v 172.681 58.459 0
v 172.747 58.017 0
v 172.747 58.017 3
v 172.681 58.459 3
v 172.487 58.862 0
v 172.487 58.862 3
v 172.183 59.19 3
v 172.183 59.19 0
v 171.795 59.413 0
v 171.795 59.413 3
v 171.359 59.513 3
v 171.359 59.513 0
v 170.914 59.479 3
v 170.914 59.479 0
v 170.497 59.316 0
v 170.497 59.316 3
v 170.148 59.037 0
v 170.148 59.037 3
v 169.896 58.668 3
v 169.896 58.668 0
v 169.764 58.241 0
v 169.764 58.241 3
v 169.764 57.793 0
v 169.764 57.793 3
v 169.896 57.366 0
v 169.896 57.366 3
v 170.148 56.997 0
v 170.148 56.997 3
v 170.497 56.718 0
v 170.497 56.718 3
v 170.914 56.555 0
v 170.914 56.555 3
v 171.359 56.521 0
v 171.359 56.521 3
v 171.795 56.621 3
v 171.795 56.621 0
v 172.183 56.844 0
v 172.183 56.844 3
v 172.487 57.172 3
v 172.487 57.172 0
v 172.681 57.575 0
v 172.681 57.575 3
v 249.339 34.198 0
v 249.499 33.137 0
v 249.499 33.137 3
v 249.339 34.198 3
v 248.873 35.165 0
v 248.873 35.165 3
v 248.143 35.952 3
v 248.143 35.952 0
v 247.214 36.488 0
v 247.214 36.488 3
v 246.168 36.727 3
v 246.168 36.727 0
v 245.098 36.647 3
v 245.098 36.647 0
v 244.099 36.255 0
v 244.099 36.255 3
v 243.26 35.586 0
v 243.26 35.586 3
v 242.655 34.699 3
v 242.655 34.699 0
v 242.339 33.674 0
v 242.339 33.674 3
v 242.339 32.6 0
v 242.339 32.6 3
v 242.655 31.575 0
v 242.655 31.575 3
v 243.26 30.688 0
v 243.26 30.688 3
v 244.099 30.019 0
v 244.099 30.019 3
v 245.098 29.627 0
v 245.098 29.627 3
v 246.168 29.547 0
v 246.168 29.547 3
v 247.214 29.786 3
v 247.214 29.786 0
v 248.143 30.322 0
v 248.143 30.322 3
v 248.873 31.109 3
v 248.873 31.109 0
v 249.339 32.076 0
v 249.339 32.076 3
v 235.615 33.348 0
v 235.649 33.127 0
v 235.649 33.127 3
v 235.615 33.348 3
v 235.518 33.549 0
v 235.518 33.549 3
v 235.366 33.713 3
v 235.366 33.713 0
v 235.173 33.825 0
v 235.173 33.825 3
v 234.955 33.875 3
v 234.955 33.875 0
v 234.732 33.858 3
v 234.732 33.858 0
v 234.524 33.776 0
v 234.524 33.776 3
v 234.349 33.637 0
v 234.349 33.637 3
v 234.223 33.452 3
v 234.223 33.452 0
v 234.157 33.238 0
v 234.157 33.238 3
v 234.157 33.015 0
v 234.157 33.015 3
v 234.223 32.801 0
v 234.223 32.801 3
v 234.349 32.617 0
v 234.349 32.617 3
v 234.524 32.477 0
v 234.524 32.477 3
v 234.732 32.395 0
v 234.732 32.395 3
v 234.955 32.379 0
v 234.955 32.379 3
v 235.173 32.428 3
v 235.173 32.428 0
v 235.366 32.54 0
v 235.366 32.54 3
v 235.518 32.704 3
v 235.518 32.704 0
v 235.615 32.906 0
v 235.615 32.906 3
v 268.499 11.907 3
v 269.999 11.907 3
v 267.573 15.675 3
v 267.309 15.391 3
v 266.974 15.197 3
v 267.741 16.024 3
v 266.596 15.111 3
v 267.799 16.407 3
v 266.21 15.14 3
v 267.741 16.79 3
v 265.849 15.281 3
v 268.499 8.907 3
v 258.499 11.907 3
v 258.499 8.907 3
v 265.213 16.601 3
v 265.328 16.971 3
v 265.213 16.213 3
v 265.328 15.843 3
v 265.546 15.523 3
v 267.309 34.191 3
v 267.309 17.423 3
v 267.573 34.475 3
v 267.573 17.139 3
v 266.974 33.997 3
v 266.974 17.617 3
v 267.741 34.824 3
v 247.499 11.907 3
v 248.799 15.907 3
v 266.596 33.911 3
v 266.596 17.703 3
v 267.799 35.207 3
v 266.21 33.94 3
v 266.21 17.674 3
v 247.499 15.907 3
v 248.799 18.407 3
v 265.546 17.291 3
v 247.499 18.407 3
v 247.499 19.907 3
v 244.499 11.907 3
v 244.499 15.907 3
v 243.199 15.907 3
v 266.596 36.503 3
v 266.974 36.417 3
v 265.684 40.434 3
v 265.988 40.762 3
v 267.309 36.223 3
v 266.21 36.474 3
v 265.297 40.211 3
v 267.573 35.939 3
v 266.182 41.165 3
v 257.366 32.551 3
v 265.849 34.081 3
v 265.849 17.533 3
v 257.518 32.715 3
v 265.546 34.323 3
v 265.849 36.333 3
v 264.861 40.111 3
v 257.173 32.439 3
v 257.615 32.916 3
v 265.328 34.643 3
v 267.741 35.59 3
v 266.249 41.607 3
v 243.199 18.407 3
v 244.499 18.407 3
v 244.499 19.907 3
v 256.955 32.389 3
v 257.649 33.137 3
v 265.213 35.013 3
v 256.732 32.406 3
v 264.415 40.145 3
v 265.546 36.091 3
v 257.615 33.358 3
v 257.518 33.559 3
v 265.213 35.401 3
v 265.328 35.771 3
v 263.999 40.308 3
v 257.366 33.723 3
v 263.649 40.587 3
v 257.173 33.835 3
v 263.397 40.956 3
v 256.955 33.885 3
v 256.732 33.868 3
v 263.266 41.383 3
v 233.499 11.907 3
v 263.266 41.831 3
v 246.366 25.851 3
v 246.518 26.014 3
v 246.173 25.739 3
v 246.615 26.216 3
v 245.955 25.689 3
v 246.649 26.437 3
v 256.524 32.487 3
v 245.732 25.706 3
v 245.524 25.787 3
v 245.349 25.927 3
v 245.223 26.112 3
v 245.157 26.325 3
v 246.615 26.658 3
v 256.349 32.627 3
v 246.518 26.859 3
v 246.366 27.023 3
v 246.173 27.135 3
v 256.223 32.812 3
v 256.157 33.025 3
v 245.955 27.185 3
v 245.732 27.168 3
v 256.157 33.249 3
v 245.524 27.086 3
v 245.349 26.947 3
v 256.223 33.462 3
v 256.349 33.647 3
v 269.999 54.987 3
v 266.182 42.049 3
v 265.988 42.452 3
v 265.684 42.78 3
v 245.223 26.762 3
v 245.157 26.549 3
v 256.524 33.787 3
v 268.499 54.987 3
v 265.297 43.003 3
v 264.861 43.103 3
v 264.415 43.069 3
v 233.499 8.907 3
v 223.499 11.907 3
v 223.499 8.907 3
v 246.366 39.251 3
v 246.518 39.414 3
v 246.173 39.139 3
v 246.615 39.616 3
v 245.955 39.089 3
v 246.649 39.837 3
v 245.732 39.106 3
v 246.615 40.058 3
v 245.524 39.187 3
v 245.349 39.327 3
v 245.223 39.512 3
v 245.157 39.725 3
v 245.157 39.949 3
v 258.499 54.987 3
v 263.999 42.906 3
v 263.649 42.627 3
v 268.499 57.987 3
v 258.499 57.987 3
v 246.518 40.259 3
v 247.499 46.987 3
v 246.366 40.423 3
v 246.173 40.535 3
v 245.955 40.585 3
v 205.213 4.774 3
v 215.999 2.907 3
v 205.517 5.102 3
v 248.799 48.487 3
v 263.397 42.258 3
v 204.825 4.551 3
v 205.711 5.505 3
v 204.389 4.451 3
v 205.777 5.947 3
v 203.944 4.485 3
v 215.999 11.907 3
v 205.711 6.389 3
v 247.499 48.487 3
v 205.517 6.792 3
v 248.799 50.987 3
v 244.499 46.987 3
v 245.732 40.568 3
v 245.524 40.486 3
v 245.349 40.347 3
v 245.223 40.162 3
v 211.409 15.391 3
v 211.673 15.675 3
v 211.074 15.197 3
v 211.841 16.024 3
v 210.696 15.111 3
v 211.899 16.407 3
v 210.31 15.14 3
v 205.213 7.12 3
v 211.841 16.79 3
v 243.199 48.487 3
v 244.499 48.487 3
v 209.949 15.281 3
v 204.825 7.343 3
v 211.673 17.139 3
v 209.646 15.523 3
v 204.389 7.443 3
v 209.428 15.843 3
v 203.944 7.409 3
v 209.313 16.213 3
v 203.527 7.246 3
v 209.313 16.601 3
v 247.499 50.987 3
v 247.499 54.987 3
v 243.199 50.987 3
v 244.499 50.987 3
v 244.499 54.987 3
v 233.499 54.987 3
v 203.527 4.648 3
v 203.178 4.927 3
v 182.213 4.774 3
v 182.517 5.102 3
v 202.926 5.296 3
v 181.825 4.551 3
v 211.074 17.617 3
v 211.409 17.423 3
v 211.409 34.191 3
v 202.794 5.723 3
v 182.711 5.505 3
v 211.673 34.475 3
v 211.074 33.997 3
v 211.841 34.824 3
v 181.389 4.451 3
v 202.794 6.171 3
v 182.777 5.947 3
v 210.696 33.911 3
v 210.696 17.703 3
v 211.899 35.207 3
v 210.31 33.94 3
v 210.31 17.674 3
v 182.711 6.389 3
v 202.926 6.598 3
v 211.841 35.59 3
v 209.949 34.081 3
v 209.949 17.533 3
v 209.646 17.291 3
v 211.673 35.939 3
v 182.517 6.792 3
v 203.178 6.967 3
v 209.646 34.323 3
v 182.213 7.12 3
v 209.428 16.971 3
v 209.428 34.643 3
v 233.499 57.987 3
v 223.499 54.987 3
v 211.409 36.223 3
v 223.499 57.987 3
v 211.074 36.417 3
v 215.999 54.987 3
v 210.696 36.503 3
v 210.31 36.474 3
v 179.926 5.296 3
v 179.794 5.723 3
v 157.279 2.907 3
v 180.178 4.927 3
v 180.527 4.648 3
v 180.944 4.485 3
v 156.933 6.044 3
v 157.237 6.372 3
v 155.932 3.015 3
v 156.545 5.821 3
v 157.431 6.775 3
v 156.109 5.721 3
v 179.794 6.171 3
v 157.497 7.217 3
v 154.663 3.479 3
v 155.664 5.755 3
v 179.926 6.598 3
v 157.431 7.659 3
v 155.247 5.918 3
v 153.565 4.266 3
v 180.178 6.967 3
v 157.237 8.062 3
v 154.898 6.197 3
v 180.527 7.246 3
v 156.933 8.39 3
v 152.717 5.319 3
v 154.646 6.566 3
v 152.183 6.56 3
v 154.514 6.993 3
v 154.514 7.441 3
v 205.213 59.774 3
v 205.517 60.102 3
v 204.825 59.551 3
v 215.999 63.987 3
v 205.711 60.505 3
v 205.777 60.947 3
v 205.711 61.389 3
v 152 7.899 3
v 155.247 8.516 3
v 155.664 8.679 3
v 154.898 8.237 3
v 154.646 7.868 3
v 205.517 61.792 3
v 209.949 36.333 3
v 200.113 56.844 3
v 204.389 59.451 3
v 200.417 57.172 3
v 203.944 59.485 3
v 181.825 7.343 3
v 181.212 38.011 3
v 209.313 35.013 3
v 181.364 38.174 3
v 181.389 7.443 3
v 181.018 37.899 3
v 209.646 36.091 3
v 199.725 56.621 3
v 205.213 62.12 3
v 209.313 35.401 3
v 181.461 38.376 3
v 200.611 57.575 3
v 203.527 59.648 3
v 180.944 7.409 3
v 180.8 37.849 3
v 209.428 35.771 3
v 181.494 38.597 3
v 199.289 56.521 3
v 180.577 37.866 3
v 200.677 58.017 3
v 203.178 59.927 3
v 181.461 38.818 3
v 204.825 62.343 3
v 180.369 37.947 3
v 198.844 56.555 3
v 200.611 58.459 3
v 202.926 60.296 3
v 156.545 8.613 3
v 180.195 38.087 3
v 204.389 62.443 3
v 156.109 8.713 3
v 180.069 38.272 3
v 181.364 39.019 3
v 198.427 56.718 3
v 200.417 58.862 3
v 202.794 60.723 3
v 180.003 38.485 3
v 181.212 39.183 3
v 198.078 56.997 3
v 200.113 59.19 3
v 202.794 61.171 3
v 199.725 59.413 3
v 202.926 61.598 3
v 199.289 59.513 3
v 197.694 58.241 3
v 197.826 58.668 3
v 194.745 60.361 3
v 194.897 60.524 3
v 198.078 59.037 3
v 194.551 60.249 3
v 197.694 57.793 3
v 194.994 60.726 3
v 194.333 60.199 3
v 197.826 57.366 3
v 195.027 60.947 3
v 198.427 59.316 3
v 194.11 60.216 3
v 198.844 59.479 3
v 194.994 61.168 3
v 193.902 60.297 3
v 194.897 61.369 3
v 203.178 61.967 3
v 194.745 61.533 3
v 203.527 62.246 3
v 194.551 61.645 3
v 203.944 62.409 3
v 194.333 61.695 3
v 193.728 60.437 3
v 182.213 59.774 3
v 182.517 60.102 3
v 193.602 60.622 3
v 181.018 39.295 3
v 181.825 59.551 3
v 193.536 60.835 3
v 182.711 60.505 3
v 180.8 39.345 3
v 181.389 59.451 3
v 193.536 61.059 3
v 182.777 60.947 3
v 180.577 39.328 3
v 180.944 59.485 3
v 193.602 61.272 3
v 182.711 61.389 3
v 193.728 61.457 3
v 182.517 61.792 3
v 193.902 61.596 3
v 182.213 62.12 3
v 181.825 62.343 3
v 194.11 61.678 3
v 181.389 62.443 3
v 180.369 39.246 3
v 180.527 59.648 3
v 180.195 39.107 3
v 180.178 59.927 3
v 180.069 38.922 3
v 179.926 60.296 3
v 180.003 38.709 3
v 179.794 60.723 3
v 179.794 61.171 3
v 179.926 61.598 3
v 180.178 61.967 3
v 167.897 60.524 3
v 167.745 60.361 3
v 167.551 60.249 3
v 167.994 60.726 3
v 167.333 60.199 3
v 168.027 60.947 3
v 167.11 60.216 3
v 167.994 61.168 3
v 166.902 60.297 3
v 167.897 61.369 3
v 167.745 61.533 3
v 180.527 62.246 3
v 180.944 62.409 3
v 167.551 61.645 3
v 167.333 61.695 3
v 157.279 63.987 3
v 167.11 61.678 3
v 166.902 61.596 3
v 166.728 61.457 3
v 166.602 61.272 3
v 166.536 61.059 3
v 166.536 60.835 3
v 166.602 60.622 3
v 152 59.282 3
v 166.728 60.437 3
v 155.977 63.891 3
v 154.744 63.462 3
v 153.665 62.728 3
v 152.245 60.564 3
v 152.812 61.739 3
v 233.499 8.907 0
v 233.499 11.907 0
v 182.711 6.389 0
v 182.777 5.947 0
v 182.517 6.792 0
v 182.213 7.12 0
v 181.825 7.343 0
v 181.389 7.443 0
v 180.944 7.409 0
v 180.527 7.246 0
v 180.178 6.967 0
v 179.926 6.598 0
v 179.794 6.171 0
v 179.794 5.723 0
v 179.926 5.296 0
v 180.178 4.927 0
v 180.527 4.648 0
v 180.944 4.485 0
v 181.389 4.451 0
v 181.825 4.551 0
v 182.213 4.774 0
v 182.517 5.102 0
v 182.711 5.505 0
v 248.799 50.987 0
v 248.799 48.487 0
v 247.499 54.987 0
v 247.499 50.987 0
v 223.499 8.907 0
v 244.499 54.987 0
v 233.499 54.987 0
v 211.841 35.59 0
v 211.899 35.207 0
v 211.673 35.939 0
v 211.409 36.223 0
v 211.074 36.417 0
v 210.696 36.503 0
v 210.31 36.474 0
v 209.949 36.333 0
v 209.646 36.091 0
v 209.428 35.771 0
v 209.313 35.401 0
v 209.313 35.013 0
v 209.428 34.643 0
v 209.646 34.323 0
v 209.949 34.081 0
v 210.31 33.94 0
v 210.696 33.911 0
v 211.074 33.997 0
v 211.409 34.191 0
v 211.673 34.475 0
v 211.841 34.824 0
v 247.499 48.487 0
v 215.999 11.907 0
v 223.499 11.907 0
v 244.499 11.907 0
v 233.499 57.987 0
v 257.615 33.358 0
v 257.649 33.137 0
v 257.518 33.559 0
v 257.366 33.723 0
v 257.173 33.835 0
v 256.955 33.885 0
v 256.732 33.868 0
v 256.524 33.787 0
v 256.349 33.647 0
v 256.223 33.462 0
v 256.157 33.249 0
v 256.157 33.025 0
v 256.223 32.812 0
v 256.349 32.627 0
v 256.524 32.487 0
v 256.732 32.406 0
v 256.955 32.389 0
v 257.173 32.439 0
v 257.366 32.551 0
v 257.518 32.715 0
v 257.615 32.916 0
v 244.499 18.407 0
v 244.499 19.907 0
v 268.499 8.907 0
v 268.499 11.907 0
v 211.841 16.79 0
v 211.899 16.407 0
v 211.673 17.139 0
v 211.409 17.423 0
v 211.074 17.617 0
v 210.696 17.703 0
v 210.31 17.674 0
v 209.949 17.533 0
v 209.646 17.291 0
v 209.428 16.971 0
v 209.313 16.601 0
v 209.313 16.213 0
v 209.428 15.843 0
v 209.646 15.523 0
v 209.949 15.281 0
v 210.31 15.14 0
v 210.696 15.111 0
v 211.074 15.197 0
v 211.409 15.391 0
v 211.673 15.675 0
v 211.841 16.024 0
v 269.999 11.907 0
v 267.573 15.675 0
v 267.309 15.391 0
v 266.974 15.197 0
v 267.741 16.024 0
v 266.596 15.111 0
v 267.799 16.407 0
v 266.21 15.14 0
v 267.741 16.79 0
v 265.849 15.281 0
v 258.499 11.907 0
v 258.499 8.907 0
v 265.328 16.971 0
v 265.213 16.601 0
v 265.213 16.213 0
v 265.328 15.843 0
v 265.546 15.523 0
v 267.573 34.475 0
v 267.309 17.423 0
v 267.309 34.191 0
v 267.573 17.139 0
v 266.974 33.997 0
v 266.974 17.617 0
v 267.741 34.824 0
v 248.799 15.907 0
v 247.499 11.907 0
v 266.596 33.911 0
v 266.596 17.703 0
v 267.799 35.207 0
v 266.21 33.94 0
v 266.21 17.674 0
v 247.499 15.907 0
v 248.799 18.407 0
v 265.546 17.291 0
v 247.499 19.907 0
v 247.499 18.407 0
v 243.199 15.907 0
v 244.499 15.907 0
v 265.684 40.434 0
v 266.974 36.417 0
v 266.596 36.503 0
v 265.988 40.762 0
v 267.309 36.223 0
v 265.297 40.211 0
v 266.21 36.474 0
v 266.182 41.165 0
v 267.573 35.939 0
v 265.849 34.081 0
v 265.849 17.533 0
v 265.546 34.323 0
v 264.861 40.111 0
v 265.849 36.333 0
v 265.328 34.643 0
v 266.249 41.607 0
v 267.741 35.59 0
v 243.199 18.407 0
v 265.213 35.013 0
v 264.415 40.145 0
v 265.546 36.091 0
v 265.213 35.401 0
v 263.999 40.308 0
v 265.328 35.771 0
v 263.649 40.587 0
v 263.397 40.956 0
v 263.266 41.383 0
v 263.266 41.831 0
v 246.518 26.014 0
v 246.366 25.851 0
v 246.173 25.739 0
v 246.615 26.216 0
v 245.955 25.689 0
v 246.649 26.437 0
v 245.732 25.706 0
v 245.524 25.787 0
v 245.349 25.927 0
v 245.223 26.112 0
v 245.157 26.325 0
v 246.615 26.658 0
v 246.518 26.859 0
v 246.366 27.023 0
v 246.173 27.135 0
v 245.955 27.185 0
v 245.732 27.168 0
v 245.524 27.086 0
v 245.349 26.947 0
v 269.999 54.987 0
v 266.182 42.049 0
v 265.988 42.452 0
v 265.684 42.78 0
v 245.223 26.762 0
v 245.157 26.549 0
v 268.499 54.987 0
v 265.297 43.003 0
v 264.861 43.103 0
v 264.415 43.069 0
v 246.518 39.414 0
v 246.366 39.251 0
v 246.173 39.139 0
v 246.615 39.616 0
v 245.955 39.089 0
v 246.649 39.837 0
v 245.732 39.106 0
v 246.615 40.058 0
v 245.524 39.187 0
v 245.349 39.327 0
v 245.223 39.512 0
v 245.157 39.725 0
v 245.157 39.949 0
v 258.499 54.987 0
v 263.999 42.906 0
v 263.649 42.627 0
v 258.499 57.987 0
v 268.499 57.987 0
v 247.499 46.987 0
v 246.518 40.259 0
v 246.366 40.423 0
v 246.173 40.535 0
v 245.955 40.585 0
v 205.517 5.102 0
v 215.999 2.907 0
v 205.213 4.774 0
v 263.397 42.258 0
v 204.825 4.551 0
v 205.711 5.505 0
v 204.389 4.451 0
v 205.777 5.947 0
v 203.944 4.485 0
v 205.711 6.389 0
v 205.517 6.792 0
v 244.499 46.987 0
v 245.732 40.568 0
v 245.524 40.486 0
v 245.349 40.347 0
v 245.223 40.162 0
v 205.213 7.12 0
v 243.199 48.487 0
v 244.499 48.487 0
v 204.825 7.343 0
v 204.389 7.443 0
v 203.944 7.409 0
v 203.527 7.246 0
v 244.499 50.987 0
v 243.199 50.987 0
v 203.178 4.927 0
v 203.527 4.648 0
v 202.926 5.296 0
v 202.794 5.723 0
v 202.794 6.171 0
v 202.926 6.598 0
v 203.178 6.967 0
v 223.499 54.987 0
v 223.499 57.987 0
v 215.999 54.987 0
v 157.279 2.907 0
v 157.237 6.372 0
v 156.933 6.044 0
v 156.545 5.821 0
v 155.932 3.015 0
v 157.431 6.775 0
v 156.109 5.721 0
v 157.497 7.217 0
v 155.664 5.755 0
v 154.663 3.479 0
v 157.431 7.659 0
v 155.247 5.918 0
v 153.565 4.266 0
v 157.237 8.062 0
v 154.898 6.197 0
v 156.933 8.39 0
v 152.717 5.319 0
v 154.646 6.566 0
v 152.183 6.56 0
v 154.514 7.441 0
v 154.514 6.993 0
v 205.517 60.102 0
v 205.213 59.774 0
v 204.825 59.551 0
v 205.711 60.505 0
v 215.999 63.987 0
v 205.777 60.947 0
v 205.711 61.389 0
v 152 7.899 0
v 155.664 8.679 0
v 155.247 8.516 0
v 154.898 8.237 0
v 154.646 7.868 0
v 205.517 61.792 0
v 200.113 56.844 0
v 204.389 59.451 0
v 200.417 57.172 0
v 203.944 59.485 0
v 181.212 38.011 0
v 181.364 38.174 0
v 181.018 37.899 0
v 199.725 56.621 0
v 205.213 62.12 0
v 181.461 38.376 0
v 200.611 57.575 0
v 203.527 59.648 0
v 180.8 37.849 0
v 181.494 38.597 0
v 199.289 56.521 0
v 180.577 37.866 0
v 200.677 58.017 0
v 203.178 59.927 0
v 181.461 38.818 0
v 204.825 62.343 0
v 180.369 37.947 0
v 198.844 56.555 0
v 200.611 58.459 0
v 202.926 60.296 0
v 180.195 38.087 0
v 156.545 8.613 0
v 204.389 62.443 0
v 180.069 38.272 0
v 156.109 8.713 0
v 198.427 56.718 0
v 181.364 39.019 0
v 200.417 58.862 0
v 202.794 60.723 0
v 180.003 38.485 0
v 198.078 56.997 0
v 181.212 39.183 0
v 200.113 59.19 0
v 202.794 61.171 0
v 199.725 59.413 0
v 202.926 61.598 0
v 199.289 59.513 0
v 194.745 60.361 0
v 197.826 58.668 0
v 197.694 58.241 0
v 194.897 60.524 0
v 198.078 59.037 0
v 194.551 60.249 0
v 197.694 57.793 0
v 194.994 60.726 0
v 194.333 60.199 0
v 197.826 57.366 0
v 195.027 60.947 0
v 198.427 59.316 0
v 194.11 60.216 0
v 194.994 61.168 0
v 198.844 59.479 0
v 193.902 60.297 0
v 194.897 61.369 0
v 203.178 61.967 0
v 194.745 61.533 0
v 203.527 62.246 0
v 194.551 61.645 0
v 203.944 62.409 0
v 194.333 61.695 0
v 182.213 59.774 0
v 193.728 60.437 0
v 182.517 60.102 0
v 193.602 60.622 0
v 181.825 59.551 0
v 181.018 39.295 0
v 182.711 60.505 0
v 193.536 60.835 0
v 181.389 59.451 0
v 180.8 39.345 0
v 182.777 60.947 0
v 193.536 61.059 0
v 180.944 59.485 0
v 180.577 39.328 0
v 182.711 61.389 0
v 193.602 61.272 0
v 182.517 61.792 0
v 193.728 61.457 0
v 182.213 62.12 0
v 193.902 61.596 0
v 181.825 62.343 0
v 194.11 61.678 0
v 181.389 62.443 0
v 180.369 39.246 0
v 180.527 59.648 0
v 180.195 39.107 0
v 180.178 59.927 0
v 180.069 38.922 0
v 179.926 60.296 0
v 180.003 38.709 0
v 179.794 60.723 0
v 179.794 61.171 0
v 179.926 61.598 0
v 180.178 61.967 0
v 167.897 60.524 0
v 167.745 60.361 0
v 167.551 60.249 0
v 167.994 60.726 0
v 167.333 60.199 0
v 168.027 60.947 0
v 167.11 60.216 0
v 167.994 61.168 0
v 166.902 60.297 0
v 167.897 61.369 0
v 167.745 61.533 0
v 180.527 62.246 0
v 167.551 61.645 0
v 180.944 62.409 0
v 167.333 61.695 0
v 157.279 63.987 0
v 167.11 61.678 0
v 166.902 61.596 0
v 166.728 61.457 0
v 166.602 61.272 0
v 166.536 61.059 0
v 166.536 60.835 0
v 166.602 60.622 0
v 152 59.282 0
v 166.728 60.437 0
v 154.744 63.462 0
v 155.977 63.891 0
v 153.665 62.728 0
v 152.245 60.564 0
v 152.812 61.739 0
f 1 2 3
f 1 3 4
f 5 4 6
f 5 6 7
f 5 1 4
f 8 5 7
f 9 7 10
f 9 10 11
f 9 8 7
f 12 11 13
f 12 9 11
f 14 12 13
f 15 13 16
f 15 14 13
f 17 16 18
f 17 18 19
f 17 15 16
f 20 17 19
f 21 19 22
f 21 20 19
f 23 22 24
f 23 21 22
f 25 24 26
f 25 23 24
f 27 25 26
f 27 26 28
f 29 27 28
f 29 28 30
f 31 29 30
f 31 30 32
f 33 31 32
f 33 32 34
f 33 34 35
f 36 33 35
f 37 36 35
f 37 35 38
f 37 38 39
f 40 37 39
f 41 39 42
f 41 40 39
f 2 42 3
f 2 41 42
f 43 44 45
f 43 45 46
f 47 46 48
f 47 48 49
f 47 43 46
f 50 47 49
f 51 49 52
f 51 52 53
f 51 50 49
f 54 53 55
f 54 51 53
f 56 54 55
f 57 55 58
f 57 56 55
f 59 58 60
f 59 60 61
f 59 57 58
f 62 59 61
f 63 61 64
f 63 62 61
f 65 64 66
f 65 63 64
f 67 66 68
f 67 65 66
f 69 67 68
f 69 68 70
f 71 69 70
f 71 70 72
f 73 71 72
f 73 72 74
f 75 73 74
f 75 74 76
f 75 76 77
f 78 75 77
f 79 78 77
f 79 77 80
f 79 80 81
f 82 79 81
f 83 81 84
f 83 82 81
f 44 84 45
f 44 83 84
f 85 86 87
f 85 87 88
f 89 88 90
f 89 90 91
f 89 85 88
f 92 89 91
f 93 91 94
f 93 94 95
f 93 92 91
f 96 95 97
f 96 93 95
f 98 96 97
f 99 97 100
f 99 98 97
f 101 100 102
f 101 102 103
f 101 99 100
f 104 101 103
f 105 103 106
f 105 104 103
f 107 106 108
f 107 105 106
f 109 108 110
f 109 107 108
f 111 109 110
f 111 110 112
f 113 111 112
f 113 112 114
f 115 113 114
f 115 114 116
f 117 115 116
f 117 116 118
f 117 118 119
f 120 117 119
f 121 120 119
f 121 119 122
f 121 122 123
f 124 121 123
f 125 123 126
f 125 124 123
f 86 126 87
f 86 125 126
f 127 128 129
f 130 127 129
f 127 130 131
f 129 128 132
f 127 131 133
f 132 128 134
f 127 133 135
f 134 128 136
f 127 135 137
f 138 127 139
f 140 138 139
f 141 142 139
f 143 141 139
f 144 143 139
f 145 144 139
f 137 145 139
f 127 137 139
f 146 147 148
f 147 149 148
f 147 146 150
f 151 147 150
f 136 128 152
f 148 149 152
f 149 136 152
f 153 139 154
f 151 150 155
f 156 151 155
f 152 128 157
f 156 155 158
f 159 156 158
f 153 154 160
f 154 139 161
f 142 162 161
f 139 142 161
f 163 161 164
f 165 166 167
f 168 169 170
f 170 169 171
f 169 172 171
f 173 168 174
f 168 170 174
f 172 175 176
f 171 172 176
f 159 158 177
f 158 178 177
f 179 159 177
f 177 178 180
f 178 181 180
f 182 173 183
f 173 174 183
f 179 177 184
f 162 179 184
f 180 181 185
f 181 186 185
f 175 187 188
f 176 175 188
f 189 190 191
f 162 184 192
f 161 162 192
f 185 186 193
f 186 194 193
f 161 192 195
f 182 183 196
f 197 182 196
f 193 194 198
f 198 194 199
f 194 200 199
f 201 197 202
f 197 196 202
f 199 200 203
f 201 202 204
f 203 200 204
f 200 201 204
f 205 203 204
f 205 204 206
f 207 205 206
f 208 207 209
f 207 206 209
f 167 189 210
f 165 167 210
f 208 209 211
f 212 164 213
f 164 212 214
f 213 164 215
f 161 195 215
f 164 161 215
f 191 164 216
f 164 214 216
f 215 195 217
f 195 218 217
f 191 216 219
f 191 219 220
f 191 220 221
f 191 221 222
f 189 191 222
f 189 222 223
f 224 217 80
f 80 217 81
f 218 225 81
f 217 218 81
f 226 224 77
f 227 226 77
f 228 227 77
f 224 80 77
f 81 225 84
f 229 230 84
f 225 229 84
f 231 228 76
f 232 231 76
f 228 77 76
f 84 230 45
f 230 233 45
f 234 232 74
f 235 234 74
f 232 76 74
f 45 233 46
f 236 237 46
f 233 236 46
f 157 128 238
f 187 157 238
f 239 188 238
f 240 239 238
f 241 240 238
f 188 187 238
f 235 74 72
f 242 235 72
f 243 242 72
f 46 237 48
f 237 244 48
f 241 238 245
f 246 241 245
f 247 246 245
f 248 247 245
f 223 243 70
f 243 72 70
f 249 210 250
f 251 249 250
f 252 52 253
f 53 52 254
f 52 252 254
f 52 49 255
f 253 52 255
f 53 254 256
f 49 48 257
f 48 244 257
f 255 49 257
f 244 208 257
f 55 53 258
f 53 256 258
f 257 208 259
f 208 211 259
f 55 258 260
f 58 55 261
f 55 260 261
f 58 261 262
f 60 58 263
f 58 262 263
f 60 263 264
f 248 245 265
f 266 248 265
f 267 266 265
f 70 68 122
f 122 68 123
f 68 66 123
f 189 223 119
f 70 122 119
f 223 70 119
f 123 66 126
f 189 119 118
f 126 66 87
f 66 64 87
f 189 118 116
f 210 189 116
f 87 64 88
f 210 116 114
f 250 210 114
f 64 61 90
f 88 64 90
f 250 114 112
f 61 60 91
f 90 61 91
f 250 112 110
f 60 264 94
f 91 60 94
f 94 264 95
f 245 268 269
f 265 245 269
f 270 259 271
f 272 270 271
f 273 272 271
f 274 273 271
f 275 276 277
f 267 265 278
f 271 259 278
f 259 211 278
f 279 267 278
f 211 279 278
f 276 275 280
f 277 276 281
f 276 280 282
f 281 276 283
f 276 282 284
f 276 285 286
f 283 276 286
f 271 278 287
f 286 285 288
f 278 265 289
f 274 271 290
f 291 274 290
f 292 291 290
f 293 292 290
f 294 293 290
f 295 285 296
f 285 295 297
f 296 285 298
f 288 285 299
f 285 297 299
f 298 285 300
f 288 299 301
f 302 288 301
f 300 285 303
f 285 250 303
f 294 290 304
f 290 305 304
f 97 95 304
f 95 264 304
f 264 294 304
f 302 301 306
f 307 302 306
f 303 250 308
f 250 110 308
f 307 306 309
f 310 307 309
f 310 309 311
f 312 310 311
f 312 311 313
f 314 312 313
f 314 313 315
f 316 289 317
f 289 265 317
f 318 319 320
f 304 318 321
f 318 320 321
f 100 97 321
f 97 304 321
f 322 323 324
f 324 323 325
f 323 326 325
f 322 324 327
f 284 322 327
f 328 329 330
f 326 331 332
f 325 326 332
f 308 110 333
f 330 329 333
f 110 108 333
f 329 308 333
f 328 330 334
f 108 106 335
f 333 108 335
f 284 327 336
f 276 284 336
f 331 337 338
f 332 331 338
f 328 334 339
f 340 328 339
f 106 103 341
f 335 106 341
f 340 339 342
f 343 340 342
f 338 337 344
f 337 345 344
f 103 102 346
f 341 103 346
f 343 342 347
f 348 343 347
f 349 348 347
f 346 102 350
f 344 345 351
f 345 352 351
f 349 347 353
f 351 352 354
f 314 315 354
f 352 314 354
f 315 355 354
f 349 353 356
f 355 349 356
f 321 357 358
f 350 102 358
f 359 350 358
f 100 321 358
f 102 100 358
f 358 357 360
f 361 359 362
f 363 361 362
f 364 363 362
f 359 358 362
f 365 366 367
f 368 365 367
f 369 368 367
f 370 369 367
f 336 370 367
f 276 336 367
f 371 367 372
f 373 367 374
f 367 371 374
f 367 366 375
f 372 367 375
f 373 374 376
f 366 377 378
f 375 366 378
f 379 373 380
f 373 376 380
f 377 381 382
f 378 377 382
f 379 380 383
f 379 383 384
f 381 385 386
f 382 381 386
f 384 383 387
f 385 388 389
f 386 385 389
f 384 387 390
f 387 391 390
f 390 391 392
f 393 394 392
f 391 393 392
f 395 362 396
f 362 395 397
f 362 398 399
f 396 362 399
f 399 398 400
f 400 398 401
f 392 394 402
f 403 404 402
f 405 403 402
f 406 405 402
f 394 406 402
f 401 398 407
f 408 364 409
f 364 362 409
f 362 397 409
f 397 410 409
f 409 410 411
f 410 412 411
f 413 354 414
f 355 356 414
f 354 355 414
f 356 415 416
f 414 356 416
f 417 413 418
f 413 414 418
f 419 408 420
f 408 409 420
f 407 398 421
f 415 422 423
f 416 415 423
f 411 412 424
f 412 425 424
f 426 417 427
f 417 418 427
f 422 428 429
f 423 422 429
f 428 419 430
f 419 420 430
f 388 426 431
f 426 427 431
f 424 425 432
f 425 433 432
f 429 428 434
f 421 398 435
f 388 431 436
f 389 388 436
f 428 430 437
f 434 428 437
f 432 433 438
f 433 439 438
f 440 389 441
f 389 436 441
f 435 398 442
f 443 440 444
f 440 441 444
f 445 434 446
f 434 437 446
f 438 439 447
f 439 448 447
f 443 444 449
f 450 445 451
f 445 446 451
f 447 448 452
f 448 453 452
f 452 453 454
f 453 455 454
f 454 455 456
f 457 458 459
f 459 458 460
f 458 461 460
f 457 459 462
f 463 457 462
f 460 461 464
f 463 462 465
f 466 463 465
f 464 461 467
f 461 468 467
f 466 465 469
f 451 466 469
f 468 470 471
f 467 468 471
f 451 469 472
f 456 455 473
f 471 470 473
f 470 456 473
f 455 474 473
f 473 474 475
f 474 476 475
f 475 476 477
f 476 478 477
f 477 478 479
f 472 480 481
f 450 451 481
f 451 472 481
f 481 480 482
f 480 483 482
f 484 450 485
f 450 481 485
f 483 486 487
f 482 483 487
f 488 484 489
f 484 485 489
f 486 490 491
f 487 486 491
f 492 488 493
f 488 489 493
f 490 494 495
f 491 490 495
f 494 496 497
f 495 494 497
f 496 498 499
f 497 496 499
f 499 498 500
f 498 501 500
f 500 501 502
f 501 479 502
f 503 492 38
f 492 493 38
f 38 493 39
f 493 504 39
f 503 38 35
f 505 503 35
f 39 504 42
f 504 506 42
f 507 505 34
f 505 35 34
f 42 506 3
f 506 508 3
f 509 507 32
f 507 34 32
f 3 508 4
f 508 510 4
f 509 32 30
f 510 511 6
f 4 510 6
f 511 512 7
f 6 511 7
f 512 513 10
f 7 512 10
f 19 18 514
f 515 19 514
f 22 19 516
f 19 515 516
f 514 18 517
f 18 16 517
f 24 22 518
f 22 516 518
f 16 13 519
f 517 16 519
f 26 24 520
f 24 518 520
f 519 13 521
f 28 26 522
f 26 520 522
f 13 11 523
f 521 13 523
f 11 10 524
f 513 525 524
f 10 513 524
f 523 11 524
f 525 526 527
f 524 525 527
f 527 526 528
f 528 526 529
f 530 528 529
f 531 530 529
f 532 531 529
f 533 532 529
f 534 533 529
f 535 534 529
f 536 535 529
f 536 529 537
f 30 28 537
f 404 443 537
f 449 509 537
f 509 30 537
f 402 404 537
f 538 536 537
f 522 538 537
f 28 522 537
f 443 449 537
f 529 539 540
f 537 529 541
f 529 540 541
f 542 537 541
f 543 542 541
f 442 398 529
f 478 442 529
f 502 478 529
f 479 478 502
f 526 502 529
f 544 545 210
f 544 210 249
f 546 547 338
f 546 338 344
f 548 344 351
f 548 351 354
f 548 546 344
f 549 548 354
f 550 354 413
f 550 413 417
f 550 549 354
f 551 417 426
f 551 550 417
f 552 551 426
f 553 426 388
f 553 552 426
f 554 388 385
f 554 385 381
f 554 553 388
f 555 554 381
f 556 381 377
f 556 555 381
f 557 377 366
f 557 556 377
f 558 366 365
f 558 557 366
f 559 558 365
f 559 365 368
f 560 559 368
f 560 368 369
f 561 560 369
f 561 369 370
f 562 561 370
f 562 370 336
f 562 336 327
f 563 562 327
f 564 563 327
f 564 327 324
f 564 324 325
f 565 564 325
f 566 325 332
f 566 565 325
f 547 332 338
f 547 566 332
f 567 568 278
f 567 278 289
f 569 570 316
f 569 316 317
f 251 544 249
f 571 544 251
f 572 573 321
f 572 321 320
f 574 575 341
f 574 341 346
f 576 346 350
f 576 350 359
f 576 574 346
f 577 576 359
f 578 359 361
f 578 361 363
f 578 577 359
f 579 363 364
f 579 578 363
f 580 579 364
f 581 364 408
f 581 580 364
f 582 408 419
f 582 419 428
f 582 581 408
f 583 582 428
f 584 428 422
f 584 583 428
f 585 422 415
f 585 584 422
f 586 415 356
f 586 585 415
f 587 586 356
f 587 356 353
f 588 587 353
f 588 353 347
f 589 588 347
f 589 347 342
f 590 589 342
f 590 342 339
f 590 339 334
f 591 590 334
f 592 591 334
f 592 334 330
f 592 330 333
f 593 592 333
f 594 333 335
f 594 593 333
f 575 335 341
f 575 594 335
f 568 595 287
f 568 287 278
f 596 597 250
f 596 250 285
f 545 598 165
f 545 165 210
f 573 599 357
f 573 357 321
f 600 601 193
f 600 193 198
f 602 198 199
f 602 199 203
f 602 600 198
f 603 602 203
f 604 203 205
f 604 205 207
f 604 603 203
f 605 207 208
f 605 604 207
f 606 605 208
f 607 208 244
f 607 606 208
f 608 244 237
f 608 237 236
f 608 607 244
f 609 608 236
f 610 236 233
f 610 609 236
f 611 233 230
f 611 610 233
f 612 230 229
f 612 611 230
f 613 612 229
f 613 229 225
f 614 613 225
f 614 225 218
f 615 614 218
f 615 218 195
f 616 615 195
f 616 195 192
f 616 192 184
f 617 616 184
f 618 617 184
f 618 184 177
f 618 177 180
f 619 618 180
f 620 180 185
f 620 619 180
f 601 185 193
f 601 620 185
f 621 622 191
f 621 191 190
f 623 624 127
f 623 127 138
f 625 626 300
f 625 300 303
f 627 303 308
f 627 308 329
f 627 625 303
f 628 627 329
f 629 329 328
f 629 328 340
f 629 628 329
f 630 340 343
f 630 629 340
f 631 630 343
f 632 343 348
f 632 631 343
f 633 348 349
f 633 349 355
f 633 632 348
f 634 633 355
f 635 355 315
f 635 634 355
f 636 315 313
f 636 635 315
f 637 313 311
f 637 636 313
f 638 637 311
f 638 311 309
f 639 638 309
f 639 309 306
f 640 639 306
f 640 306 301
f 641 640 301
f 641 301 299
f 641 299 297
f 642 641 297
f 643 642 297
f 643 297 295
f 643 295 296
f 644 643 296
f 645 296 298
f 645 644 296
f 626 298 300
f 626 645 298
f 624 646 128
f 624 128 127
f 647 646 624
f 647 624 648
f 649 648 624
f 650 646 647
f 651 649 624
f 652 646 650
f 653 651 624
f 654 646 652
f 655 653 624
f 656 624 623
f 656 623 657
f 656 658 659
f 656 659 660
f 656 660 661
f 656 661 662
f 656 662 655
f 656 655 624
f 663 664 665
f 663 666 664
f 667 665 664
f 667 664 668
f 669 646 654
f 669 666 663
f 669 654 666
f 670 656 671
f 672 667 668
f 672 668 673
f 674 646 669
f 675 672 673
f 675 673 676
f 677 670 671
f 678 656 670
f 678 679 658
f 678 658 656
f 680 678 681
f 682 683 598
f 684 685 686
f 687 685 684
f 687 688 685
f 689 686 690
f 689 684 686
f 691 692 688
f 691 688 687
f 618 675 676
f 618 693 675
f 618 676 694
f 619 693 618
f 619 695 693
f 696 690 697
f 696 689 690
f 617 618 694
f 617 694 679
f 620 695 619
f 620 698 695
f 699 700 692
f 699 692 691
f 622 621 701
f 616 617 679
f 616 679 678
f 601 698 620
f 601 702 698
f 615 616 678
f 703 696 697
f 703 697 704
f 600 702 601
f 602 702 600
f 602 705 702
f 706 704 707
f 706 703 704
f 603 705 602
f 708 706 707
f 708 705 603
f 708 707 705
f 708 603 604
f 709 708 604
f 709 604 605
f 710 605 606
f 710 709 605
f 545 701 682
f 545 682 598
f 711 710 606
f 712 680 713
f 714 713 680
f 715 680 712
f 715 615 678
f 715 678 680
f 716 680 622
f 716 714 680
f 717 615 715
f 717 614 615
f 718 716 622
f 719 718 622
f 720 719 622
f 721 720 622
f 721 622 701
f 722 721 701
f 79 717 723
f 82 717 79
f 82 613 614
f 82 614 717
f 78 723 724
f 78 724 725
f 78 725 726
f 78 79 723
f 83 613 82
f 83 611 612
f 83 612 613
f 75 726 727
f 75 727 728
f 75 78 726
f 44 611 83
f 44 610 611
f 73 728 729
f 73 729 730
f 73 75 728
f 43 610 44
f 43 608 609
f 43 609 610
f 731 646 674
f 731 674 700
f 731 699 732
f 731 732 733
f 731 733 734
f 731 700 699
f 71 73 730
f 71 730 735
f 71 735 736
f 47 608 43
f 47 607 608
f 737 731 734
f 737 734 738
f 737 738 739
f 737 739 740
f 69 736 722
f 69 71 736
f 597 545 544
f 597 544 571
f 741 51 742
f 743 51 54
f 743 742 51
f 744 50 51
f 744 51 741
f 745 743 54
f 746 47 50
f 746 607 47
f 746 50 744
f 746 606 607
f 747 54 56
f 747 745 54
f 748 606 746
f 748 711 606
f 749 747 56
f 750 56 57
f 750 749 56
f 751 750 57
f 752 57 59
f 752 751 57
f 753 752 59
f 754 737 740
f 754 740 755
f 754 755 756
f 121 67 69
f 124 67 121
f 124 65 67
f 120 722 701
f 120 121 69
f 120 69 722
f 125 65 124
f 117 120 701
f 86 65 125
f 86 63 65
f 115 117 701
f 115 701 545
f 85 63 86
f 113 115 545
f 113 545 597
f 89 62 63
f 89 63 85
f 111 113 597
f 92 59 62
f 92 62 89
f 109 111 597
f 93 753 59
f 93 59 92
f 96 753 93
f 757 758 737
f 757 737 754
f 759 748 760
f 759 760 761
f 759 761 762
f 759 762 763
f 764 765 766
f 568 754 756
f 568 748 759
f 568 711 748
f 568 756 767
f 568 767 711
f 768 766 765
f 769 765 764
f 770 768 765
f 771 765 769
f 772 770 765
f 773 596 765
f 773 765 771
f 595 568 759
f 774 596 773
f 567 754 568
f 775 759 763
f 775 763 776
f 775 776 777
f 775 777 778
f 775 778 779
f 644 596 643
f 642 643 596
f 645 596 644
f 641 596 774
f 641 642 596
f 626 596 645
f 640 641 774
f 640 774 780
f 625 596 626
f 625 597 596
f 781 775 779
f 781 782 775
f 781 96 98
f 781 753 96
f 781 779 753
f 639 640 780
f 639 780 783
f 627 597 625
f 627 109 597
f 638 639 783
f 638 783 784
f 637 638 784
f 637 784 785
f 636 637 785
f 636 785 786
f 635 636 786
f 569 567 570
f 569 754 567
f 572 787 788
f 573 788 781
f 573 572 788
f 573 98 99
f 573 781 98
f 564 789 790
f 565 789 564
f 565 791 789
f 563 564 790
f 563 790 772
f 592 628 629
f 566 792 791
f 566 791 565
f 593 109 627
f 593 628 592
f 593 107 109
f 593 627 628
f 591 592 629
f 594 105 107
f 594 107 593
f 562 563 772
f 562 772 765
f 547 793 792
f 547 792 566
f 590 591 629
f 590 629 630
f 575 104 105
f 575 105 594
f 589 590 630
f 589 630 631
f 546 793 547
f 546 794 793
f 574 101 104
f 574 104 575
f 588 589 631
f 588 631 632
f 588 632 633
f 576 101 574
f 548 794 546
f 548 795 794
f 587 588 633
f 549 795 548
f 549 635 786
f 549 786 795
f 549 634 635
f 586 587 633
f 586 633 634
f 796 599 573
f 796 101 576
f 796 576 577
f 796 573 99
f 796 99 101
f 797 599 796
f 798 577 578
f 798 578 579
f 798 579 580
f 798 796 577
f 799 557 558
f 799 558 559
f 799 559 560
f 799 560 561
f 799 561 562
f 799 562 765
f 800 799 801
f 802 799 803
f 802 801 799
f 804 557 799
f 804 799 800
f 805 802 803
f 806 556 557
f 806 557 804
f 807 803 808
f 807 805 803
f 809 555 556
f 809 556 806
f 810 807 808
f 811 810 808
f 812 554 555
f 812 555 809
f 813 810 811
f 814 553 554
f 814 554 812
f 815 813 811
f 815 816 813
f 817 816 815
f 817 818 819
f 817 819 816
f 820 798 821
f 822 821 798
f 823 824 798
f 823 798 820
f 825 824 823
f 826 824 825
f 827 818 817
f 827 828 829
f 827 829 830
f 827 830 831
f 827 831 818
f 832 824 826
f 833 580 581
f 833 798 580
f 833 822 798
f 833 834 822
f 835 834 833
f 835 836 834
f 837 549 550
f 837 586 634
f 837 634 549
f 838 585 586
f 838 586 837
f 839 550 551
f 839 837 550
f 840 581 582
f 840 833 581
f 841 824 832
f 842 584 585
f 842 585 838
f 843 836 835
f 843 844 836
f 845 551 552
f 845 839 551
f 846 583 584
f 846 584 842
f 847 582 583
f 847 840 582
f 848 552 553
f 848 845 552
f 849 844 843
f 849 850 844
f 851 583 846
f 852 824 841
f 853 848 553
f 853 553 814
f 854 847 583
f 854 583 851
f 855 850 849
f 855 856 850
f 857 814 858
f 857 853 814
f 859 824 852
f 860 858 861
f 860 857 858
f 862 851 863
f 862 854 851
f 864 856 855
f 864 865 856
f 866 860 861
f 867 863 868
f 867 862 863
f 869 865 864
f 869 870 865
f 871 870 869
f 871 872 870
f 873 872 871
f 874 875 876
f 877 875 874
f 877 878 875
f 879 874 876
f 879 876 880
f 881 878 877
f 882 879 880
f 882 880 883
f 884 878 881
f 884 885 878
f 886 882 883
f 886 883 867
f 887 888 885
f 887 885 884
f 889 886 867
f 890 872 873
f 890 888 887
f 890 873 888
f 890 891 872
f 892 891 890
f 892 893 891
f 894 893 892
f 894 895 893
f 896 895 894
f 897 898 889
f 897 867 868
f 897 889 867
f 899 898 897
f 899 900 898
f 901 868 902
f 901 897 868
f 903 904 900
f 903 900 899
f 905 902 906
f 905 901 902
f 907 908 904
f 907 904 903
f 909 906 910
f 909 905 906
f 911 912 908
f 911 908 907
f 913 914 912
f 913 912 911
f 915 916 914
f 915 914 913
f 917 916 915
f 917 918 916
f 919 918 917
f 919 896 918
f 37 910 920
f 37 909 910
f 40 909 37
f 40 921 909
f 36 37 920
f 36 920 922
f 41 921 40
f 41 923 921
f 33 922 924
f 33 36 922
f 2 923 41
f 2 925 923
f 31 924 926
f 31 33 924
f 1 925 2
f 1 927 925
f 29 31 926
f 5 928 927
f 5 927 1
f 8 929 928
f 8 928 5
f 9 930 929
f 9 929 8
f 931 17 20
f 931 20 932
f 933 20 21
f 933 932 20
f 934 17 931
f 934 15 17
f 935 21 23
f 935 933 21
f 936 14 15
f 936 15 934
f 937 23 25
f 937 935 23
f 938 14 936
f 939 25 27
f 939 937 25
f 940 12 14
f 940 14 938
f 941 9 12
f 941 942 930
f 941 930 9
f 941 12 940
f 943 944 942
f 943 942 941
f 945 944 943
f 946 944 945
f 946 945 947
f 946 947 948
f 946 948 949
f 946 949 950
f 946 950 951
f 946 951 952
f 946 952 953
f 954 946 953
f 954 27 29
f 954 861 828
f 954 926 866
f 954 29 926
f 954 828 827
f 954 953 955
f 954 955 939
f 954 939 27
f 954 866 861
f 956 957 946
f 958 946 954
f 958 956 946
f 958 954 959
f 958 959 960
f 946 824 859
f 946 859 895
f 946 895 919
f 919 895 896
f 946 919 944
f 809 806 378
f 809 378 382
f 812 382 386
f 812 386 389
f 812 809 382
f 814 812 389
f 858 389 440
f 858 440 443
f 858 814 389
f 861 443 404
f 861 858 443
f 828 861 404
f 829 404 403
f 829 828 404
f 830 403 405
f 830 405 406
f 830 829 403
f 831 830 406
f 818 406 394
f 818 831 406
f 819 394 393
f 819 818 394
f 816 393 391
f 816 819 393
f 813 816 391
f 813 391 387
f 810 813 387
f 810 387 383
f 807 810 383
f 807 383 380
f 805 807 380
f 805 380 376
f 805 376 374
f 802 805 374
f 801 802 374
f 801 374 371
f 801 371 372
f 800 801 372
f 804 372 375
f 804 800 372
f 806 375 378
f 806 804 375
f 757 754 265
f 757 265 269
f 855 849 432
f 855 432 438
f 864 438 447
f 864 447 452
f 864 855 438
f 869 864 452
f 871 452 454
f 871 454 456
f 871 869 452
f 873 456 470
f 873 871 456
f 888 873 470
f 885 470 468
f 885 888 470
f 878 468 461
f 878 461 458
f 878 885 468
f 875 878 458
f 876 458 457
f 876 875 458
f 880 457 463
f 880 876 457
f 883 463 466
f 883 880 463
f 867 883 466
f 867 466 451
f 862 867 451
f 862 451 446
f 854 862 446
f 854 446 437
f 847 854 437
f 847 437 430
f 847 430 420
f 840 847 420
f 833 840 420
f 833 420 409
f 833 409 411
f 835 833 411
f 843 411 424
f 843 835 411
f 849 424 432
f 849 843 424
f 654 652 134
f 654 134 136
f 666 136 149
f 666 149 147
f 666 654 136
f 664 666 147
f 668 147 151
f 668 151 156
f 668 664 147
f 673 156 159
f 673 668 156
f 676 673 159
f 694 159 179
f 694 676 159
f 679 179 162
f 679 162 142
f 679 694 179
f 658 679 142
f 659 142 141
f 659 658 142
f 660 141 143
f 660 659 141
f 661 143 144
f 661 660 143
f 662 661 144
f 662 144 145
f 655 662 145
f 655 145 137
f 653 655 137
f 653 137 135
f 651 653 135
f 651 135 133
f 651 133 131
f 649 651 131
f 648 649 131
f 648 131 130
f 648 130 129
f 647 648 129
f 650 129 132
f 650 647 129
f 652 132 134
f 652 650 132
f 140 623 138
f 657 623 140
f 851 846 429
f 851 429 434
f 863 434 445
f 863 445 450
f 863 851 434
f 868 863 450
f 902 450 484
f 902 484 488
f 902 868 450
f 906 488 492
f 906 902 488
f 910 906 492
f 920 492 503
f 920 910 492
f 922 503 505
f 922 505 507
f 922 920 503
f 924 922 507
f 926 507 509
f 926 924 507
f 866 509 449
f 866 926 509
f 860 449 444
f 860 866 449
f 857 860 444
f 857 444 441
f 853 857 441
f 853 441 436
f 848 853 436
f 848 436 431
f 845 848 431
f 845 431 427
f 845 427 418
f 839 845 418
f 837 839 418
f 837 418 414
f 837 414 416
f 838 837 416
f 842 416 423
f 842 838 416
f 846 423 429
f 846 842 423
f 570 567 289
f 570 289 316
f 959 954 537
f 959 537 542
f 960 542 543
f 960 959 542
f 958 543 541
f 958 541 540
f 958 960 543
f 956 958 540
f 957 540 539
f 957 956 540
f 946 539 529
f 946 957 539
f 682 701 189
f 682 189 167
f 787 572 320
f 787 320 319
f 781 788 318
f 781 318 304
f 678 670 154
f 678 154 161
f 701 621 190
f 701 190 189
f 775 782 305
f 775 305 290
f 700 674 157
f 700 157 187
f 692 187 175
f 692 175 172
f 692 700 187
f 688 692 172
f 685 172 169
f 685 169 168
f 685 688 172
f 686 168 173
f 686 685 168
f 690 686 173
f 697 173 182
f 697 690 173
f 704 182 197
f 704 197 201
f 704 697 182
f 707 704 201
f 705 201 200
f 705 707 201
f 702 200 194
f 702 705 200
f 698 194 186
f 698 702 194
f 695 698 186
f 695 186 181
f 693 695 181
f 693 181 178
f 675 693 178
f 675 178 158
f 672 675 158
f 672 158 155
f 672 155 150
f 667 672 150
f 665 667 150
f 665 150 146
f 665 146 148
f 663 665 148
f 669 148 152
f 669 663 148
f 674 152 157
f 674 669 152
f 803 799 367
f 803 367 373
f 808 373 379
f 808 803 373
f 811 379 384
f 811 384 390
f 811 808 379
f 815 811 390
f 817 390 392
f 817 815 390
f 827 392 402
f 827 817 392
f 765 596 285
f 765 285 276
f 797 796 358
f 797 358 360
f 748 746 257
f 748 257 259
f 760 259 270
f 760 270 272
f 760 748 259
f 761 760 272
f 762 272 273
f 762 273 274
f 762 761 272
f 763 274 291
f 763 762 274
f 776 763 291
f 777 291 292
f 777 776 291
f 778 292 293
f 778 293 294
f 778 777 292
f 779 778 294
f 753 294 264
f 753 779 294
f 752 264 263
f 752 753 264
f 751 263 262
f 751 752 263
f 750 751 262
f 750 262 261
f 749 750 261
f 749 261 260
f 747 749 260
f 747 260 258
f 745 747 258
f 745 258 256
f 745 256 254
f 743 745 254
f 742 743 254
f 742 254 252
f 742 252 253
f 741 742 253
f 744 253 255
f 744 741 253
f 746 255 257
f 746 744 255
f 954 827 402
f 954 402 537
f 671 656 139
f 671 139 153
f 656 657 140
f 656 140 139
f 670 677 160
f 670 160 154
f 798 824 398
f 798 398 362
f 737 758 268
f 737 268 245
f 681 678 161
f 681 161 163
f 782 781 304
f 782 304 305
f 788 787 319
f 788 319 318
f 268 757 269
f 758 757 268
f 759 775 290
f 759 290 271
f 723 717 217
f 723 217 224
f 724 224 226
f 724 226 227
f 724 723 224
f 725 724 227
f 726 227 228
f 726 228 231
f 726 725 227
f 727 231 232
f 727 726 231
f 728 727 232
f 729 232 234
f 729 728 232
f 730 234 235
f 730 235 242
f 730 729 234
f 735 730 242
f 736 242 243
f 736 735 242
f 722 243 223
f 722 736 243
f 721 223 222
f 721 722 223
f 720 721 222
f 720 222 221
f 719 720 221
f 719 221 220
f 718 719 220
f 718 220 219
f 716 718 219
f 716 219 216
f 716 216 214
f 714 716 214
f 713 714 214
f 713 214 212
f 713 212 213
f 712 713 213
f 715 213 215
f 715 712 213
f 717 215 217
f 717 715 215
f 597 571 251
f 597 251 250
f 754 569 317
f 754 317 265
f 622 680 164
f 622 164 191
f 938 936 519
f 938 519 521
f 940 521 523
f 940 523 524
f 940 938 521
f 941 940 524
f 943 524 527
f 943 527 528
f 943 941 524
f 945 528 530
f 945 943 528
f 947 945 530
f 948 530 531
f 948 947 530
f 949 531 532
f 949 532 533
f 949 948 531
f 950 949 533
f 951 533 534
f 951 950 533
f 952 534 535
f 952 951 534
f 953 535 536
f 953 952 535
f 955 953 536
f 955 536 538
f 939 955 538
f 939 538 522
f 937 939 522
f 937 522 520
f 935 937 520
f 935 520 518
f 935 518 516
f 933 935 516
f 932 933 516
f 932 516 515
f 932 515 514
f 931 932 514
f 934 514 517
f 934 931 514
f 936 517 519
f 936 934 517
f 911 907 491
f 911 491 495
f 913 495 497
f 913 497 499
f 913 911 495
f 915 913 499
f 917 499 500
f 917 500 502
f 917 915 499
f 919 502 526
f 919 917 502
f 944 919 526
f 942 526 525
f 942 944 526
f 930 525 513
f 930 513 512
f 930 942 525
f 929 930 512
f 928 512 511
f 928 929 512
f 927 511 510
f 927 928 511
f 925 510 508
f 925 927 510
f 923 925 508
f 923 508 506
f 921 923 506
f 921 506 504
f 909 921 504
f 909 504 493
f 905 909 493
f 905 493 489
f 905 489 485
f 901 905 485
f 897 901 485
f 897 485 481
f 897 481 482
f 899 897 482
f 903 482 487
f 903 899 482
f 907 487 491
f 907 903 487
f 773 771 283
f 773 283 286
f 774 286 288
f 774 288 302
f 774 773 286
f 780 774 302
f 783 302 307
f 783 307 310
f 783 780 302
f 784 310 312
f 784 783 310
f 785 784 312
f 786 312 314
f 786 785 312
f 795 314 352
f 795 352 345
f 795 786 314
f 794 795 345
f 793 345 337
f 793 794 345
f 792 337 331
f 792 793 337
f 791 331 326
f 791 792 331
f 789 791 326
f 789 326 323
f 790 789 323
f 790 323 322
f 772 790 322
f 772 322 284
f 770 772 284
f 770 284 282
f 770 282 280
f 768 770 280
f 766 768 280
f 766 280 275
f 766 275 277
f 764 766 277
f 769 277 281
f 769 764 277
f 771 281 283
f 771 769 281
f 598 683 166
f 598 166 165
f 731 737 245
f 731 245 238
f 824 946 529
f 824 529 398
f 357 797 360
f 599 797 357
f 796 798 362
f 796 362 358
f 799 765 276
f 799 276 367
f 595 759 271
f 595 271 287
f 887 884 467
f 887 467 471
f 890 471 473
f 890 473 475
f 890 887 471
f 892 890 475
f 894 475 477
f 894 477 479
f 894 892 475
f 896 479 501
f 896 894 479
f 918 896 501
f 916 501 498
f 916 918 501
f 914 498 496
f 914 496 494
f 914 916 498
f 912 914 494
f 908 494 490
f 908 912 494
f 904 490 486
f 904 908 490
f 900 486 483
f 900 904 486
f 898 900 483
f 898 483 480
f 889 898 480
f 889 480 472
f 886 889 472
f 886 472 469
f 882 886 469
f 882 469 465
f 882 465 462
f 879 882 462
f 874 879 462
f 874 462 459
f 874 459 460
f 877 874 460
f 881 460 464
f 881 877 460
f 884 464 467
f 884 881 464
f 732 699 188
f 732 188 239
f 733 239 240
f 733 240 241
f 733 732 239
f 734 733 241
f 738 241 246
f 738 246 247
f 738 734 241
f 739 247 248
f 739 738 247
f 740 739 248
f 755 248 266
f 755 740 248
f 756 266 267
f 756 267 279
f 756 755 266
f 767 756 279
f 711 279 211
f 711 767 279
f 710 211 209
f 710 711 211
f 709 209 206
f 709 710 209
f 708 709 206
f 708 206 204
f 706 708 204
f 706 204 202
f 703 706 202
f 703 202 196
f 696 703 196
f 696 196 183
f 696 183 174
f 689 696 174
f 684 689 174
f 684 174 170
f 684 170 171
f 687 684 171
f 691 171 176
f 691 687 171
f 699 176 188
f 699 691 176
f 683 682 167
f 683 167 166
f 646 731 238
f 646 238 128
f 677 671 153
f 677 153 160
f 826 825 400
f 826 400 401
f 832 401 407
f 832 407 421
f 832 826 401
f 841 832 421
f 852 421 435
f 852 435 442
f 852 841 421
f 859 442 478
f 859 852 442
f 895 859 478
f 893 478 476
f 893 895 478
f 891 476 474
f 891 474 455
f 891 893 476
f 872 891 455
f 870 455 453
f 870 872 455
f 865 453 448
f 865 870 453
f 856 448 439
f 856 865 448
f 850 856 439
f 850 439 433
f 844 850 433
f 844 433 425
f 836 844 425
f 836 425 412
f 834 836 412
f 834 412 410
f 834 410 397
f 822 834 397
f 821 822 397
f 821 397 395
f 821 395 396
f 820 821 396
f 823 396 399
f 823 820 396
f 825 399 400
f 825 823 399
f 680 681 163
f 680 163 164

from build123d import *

# Parameters (mm, degrees)
SKETCH_1_R      = 1.3
SKETCH_1_R_2    = 1.500000002
SKETCH_1_R_3    = 0.75
SKETCH_1_R_4    = 1.5
SKETCH_1_R_5    = 3.600000001
EXTRUDE_1_DEPTH = 3


with BuildPart() as part:
    # 草圖1 → 填料-伸長1 (new body)
    with BuildSketch(Plane.XY):
        with BuildLine():
            Line((215.998800526, 63.986947452), (215.998800526, 54.986947452))
            Line((215.998800526, 54.986947452), (223.498800526, 54.986947452))
            Line((223.498800526, 54.986947452), (223.498800526, 57.986947452))
            Line((223.498800526, 57.986947452), (233.498800526, 57.986947452))
            Line((233.498800526, 57.986947452), (233.498800526, 54.986947452))
            Line((233.498800526, 54.986947452), (244.498800526, 54.986947452))
            Line((244.498800526, 54.986947452), (244.498800526, 50.987047452))
            Line((244.498800526, 50.987047452), (243.198800526, 50.987047452))
            Line((243.198800526, 50.987047452), (243.198800526, 48.487047452))
            Line((243.198800526, 48.487047452), (244.498800526, 48.487047452))
            Line((244.498800526, 48.487047452), (244.498800526, 46.986947452))
            Line((244.498800526, 46.986947452), (247.498800526, 46.986947452))
            Line((247.498800526, 46.986947452), (247.498800526, 48.487047452))
            Line((247.498800526, 48.487047452), (248.798800526, 48.487047452))
            Line((248.798800526, 48.487047452), (248.798800526, 50.987047452))
            Line((248.798800526, 50.987047452), (247.498800526, 50.987047452))
            Line((247.498800526, 50.987047452), (247.498800526, 54.986947452))
            Line((247.498800526, 54.986947452), (258.498800526, 54.986947452))
            Line((258.498800526, 54.986947452), (258.498800526, 57.986947452))
            Line((258.498800526, 57.986947452), (268.498800526, 57.986947452))
            Line((268.498800526, 57.986947452), (268.498800526, 54.986947452))
            Line((268.498800526, 54.986947452), (269.998800526, 54.986947452))
            Line((269.998800526, 54.986947452), (269.998800526, 11.906947452))
            Line((269.998800526, 11.906947452), (268.498800526, 11.906947452))
            Line((268.498800526, 11.906947452), (268.498800526, 8.906947452))
            Line((268.498800526, 8.906947452), (258.498800526, 8.906947452))
            Line((258.498800526, 8.906947452), (258.498800526, 11.906947452))
            Line((258.498800526, 11.906947452), (247.498800526, 11.906947452))
            Line((247.498800526, 11.906947452), (247.498800526, 15.906947452))
            Line((247.498800526, 15.906947452), (248.798800526, 15.906947452))
            Line((248.798800526, 15.906947452), (248.798800526, 18.406947452))
            Line((248.798800526, 18.406947452), (247.498800526, 18.406947452))
            Line((247.498800526, 18.406947452), (247.498800526, 19.906947452))
            Line((247.498800526, 19.906947452), (244.498800526, 19.906947452))
            Line((244.498800526, 19.906947452), (244.498800526, 18.406947452))
            Line((244.498800526, 18.406947452), (243.198800526, 18.406947452))
            Line((243.198800526, 18.406947452), (243.198800526, 15.906947452))
            Line((243.198800526, 15.906947452), (244.498800526, 15.906947452))
            Line((244.498800526, 15.906947452), (244.498800526, 11.906947452))
            Line((244.498800526, 11.906947452), (233.498800526, 11.906947452))
            Line((233.498800526, 11.906947452), (233.498800526, 8.906947452))
            Line((233.498800526, 8.906947452), (223.498800526, 8.906947452))
            Line((223.498800526, 8.906947452), (223.498800526, 11.906947452))
            Line((223.498800526, 11.906947452), (215.998800526, 11.906947452))
            Line((215.998800526, 11.906947452), (215.998800526, 2.906947452))
            Line((215.998800526, 2.906947452), (157.278776491, 2.906947452))
            ThreePointArc((157.278776491, 2.906947452), (153.564569232, 4.266490303), (152.0002, 7.899180934))
            Line((152.0002, 7.899180934), (152.0002, 59.281989405))
            ThreePointArc((152.0002, 59.281989405), (153.665059528, 62.727697415), (157.278776491, 63.986947452))
            Line((157.278776491, 63.986947452), (215.998800526, 63.986947452))
        make_face()
        with Locations((266.498800526, 16.406947452)):
            Circle(SKETCH_1_R, mode=Mode.SUBTRACT)
        with Locations((264.748800526, 41.606947452)):
            Circle(SKETCH_1_R_2, mode=Mode.SUBTRACT)
        with Locations((266.498800526, 35.206947452)):
            Circle(SKETCH_1_R, mode=Mode.SUBTRACT)
        with Locations((256.898805336, 33.13699656)):
            Circle(SKETCH_1_R_3, mode=Mode.SUBTRACT)
        with Locations((245.898805336, 39.836947452)):
            Circle(SKETCH_1_R_3, mode=Mode.SUBTRACT)
        with Locations((245.898805336, 26.436947452)):
            Circle(SKETCH_1_R_3, mode=Mode.SUBTRACT)
        with Locations((234.898744394, 33.126641893)):
            Circle(SKETCH_1_R_3, mode=Mode.SUBTRACT)
        with Locations((155.997377017, 7.216947452)):
            Circle(SKETCH_1_R_4, mode=Mode.SUBTRACT)
        with Locations((181.277377017, 5.946947452)):
            Circle(SKETCH_1_R_4, mode=Mode.SUBTRACT)
        with Locations((204.277377017, 5.946947452)):
            Circle(SKETCH_1_R_4, mode=Mode.SUBTRACT)
        with Locations((210.598800526, 16.406947452)):
            Circle(SKETCH_1_R, mode=Mode.SUBTRACT)
        with Locations((210.598800526, 35.206947452)):
            Circle(SKETCH_1_R, mode=Mode.SUBTRACT)
        with Locations((180.744327914, 38.596947452)):
            Circle(SKETCH_1_R_3, mode=Mode.SUBTRACT)
        with Locations((204.277377017, 60.946947452)):
            Circle(SKETCH_1_R_4, mode=Mode.SUBTRACT)
        with Locations((199.177377017, 58.016947452)):
            Circle(SKETCH_1_R_4, mode=Mode.SUBTRACT)
        with Locations((194.277377017, 60.946947452)):
            Circle(SKETCH_1_R_3, mode=Mode.SUBTRACT)
        with Locations((181.277377017, 60.946947452)):
            Circle(SKETCH_1_R_4, mode=Mode.SUBTRACT)
        with Locations((167.277377017, 60.946947452)):
            Circle(SKETCH_1_R_3, mode=Mode.SUBTRACT)
        with Locations((171.247377017, 58.016947452)):
            Circle(SKETCH_1_R_4, mode=Mode.SUBTRACT)
        with Locations((245.898805335, 33.13699656)):
            Circle(SKETCH_1_R_5, mode=Mode.SUBTRACT)
    extrude(amount=EXTRUDE_1_DEPTH)


solid = part.part
